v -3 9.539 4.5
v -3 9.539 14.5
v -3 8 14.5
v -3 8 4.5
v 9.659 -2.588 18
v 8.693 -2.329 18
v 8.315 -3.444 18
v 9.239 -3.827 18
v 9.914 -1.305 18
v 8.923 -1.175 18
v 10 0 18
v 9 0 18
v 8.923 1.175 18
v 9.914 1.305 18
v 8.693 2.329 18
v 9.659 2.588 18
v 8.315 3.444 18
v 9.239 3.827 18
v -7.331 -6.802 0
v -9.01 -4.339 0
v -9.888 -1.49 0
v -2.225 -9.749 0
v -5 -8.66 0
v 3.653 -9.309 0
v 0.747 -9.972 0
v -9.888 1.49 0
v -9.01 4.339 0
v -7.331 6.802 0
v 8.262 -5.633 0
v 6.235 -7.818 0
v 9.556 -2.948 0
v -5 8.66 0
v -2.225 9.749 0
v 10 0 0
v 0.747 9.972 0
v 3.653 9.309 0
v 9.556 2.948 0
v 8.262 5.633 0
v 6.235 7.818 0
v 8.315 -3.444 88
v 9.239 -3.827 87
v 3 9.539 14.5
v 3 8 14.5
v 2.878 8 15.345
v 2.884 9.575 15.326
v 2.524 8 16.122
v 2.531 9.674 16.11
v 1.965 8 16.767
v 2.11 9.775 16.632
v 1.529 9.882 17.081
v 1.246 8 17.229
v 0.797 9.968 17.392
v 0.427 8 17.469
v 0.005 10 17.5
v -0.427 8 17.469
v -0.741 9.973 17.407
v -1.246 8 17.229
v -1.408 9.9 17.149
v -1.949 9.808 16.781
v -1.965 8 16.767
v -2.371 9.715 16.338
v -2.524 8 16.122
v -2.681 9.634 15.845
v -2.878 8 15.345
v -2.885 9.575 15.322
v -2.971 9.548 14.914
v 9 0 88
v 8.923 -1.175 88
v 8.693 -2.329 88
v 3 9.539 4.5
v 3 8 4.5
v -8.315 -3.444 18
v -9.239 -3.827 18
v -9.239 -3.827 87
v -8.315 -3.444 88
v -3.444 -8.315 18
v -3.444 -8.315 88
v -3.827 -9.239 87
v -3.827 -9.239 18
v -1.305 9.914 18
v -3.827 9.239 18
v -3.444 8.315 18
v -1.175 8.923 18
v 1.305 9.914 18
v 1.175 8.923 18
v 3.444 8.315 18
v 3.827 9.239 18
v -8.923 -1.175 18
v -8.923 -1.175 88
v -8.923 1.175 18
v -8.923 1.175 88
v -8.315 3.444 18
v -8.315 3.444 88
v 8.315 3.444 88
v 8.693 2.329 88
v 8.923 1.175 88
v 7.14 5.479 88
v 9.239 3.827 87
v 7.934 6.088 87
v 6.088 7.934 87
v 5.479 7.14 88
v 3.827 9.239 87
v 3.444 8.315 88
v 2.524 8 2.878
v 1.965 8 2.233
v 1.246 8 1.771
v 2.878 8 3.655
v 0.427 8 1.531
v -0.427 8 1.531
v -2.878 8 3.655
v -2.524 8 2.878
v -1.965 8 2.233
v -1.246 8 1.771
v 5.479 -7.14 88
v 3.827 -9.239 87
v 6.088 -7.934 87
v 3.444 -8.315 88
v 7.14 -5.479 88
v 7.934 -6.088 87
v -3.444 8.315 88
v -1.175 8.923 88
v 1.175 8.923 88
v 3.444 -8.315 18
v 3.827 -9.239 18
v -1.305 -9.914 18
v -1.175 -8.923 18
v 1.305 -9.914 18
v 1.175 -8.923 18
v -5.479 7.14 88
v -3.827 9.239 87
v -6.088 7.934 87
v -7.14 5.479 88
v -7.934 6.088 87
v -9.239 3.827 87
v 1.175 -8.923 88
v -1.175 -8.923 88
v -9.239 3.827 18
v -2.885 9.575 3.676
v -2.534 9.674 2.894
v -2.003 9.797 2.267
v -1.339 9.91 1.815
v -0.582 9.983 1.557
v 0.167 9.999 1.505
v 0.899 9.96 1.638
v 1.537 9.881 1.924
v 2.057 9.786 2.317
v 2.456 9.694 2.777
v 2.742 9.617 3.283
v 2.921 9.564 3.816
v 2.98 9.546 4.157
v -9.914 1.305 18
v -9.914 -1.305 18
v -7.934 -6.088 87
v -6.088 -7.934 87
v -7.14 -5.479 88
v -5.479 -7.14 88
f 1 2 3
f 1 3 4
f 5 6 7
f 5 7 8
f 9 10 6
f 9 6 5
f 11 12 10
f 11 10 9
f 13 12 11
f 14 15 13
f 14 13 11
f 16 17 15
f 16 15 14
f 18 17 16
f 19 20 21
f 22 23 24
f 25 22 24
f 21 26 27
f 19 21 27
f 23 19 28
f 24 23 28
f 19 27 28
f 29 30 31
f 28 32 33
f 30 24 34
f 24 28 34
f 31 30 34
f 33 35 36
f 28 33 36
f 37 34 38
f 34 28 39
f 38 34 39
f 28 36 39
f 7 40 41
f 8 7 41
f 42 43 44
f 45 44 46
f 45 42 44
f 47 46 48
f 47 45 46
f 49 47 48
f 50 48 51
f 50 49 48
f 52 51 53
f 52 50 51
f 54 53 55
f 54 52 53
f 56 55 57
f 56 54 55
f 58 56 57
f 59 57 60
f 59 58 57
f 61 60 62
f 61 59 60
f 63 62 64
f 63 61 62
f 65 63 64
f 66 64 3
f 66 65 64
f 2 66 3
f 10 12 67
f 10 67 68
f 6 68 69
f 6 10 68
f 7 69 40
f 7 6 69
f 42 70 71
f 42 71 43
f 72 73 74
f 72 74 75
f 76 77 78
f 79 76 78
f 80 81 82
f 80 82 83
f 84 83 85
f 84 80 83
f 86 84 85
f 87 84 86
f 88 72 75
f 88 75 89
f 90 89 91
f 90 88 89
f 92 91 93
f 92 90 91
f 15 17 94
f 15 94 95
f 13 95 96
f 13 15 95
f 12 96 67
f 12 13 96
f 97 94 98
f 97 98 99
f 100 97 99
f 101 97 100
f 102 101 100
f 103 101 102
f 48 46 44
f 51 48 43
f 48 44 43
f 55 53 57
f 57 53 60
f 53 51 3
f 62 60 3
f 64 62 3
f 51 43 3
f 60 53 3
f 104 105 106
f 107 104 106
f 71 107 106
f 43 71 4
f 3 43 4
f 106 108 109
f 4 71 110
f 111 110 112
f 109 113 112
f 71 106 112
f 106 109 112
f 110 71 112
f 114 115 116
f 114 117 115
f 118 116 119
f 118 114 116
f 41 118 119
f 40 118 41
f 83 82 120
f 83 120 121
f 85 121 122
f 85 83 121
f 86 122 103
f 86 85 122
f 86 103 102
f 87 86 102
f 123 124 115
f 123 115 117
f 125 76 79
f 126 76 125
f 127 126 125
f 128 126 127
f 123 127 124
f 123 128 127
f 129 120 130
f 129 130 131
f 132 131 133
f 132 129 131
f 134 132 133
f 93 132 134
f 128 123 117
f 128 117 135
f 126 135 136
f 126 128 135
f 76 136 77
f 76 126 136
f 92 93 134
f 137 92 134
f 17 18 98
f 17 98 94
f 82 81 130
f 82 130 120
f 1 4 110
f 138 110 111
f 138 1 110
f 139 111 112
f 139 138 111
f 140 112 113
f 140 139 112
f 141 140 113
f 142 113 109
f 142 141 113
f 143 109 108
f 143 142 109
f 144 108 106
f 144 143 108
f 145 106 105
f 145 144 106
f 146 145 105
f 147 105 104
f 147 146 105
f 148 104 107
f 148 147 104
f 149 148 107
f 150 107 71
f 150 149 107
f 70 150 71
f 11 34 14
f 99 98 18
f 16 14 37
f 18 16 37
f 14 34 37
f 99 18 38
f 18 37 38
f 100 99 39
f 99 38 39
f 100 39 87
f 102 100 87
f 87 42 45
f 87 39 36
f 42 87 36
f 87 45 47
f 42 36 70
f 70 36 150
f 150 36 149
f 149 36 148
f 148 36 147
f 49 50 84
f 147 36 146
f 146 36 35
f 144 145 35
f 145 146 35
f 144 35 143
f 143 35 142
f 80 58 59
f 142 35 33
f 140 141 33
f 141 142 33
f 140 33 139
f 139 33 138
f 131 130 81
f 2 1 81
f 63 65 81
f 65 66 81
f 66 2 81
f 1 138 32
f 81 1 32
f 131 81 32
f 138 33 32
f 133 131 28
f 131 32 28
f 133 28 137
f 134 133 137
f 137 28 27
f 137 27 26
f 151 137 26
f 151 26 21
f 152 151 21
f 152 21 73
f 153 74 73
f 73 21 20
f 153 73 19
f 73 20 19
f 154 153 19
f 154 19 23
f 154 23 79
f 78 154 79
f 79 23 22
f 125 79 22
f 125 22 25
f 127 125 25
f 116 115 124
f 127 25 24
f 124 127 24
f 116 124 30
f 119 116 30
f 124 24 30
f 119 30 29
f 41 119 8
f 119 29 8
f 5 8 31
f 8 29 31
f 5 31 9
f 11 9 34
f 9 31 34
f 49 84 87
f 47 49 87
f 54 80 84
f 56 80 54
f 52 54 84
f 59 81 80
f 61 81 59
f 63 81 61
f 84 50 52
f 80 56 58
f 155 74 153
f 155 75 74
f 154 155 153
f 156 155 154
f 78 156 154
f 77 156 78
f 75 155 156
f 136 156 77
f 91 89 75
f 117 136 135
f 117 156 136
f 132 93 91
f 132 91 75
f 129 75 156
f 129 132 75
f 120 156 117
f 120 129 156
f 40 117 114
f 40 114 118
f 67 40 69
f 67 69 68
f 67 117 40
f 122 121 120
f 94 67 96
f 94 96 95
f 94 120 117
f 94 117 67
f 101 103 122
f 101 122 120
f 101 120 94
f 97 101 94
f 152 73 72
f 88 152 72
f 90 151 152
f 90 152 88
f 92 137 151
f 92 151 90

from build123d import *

# Parameters (mm, degrees)
CROQUIS1_R              = 10
SALIENTE_EXTRUIR1_DEPTH = 88
CHAFL_N1_SIZE           = 1
CORTAR_EXTRUIR1_START   = -70
CORTAR_EXTRUIR1_DEPTH   = 70
CORTAR_EXTRUIR5_DEPTH   = 2


with BuildPart() as part:
    # Croquis1 → Saliente-Extruir1 (new body)
    with BuildSketch(Plane.XY):
        Circle(CROQUIS1_R)
    extrude(amount=SALIENTE_EXTRUIR1_DEPTH)

    # Chaflán1
    chafl_n1_edges = [part.edges().sort_by_distance(p)[0] for p in [
        (-10, 0, 88),
    ]]
    chamfer(chafl_n1_edges, length=CHAFL_N1_SIZE)

    # Croquis3 → Cortar-Extruir1 (cut)
    with BuildSketch(Plane.XY.offset(88).offset(CORTAR_EXTRUIR1_START)):
        with BuildLine():
            ThreePointArc((3.826834324, 9.238795325), (0, 10), (-3.826834324, 9.238795325))
            Line((-3.826834324, 9.238795325), (-3.444150891, 8.314915793))
            ThreePointArc((-3.444150891, 8.314915793), (0, 9), (3.444150891, 8.314915793))
            Line((3.444150891, 8.314915793), (3.826834324, 9.238795325))
        make_face()
        with BuildLine():
            ThreePointArc((10, 0), (9.807852804, 1.95090322), (9.238795325, 3.826834324))
            Line((9.238795325, 3.826834324), (8.314915793, 3.444150891))
            ThreePointArc((8.314915793, 3.444150891), (8.827067524, 1.755812898), (9, 0))
            ThreePointArc((9, 0), (8.827067524, -1.755812898), (8.314915793, -3.444150891))
            Line((8.314915793, -3.444150891), (9.238795325, -3.826834324))
            ThreePointArc((9.238795325, -3.826834324), (9.807852804, -1.95090322), (10, 0))
        make_face()
        with BuildLine():
            Line((-3.444150891, -8.314915793), (-3.826834324, -9.238795325))
            ThreePointArc((-3.826834324, -9.238795325), (0, -10), (3.826834324, -9.238795325))
            Line((3.826834324, -9.238795325), (3.444150891, -8.314915793))
            ThreePointArc((3.444150891, -8.314915793), (0, -9), (-3.444150891, -8.314915793))
        make_face()
        with BuildLine():
            Line((-8.314915793, 3.444150891), (-9.238795325, 3.826834324))
            ThreePointArc((-9.238795325, 3.826834324), (-10, 0), (-9.238795325, -3.826834324))
            Line((-9.238795325, -3.826834324), (-8.314915793, -3.444150891))
            ThreePointArc((-8.314915793, -3.444150891), (-9, 0), (-8.314915793, 3.444150891))
        make_face()
    extrude(amount=CORTAR_EXTRUIR1_DEPTH, mode=Mode.SUBTRACT)

    # Croquis4 → Cortar-Extruir5 (cut)
    with BuildSketch(Plane(origin=(0, 10, 0), x_dir=(1, 0, 0), z_dir=(0, 1, 0))):
        with BuildLine():
            Line((-3, -14.5), (-3, -4.5))
            ThreePointArc((-3, -4.5), (0, -1.5), (3, -4.5))
            Line((3, -4.5), (3, -14.5))
            ThreePointArc((3, -14.5), (0, -17.5), (-3, -14.5))
        make_face()
    extrude(amount=-CORTAR_EXTRUIR5_DEPTH, mode=Mode.SUBTRACT)


solid = part.part
